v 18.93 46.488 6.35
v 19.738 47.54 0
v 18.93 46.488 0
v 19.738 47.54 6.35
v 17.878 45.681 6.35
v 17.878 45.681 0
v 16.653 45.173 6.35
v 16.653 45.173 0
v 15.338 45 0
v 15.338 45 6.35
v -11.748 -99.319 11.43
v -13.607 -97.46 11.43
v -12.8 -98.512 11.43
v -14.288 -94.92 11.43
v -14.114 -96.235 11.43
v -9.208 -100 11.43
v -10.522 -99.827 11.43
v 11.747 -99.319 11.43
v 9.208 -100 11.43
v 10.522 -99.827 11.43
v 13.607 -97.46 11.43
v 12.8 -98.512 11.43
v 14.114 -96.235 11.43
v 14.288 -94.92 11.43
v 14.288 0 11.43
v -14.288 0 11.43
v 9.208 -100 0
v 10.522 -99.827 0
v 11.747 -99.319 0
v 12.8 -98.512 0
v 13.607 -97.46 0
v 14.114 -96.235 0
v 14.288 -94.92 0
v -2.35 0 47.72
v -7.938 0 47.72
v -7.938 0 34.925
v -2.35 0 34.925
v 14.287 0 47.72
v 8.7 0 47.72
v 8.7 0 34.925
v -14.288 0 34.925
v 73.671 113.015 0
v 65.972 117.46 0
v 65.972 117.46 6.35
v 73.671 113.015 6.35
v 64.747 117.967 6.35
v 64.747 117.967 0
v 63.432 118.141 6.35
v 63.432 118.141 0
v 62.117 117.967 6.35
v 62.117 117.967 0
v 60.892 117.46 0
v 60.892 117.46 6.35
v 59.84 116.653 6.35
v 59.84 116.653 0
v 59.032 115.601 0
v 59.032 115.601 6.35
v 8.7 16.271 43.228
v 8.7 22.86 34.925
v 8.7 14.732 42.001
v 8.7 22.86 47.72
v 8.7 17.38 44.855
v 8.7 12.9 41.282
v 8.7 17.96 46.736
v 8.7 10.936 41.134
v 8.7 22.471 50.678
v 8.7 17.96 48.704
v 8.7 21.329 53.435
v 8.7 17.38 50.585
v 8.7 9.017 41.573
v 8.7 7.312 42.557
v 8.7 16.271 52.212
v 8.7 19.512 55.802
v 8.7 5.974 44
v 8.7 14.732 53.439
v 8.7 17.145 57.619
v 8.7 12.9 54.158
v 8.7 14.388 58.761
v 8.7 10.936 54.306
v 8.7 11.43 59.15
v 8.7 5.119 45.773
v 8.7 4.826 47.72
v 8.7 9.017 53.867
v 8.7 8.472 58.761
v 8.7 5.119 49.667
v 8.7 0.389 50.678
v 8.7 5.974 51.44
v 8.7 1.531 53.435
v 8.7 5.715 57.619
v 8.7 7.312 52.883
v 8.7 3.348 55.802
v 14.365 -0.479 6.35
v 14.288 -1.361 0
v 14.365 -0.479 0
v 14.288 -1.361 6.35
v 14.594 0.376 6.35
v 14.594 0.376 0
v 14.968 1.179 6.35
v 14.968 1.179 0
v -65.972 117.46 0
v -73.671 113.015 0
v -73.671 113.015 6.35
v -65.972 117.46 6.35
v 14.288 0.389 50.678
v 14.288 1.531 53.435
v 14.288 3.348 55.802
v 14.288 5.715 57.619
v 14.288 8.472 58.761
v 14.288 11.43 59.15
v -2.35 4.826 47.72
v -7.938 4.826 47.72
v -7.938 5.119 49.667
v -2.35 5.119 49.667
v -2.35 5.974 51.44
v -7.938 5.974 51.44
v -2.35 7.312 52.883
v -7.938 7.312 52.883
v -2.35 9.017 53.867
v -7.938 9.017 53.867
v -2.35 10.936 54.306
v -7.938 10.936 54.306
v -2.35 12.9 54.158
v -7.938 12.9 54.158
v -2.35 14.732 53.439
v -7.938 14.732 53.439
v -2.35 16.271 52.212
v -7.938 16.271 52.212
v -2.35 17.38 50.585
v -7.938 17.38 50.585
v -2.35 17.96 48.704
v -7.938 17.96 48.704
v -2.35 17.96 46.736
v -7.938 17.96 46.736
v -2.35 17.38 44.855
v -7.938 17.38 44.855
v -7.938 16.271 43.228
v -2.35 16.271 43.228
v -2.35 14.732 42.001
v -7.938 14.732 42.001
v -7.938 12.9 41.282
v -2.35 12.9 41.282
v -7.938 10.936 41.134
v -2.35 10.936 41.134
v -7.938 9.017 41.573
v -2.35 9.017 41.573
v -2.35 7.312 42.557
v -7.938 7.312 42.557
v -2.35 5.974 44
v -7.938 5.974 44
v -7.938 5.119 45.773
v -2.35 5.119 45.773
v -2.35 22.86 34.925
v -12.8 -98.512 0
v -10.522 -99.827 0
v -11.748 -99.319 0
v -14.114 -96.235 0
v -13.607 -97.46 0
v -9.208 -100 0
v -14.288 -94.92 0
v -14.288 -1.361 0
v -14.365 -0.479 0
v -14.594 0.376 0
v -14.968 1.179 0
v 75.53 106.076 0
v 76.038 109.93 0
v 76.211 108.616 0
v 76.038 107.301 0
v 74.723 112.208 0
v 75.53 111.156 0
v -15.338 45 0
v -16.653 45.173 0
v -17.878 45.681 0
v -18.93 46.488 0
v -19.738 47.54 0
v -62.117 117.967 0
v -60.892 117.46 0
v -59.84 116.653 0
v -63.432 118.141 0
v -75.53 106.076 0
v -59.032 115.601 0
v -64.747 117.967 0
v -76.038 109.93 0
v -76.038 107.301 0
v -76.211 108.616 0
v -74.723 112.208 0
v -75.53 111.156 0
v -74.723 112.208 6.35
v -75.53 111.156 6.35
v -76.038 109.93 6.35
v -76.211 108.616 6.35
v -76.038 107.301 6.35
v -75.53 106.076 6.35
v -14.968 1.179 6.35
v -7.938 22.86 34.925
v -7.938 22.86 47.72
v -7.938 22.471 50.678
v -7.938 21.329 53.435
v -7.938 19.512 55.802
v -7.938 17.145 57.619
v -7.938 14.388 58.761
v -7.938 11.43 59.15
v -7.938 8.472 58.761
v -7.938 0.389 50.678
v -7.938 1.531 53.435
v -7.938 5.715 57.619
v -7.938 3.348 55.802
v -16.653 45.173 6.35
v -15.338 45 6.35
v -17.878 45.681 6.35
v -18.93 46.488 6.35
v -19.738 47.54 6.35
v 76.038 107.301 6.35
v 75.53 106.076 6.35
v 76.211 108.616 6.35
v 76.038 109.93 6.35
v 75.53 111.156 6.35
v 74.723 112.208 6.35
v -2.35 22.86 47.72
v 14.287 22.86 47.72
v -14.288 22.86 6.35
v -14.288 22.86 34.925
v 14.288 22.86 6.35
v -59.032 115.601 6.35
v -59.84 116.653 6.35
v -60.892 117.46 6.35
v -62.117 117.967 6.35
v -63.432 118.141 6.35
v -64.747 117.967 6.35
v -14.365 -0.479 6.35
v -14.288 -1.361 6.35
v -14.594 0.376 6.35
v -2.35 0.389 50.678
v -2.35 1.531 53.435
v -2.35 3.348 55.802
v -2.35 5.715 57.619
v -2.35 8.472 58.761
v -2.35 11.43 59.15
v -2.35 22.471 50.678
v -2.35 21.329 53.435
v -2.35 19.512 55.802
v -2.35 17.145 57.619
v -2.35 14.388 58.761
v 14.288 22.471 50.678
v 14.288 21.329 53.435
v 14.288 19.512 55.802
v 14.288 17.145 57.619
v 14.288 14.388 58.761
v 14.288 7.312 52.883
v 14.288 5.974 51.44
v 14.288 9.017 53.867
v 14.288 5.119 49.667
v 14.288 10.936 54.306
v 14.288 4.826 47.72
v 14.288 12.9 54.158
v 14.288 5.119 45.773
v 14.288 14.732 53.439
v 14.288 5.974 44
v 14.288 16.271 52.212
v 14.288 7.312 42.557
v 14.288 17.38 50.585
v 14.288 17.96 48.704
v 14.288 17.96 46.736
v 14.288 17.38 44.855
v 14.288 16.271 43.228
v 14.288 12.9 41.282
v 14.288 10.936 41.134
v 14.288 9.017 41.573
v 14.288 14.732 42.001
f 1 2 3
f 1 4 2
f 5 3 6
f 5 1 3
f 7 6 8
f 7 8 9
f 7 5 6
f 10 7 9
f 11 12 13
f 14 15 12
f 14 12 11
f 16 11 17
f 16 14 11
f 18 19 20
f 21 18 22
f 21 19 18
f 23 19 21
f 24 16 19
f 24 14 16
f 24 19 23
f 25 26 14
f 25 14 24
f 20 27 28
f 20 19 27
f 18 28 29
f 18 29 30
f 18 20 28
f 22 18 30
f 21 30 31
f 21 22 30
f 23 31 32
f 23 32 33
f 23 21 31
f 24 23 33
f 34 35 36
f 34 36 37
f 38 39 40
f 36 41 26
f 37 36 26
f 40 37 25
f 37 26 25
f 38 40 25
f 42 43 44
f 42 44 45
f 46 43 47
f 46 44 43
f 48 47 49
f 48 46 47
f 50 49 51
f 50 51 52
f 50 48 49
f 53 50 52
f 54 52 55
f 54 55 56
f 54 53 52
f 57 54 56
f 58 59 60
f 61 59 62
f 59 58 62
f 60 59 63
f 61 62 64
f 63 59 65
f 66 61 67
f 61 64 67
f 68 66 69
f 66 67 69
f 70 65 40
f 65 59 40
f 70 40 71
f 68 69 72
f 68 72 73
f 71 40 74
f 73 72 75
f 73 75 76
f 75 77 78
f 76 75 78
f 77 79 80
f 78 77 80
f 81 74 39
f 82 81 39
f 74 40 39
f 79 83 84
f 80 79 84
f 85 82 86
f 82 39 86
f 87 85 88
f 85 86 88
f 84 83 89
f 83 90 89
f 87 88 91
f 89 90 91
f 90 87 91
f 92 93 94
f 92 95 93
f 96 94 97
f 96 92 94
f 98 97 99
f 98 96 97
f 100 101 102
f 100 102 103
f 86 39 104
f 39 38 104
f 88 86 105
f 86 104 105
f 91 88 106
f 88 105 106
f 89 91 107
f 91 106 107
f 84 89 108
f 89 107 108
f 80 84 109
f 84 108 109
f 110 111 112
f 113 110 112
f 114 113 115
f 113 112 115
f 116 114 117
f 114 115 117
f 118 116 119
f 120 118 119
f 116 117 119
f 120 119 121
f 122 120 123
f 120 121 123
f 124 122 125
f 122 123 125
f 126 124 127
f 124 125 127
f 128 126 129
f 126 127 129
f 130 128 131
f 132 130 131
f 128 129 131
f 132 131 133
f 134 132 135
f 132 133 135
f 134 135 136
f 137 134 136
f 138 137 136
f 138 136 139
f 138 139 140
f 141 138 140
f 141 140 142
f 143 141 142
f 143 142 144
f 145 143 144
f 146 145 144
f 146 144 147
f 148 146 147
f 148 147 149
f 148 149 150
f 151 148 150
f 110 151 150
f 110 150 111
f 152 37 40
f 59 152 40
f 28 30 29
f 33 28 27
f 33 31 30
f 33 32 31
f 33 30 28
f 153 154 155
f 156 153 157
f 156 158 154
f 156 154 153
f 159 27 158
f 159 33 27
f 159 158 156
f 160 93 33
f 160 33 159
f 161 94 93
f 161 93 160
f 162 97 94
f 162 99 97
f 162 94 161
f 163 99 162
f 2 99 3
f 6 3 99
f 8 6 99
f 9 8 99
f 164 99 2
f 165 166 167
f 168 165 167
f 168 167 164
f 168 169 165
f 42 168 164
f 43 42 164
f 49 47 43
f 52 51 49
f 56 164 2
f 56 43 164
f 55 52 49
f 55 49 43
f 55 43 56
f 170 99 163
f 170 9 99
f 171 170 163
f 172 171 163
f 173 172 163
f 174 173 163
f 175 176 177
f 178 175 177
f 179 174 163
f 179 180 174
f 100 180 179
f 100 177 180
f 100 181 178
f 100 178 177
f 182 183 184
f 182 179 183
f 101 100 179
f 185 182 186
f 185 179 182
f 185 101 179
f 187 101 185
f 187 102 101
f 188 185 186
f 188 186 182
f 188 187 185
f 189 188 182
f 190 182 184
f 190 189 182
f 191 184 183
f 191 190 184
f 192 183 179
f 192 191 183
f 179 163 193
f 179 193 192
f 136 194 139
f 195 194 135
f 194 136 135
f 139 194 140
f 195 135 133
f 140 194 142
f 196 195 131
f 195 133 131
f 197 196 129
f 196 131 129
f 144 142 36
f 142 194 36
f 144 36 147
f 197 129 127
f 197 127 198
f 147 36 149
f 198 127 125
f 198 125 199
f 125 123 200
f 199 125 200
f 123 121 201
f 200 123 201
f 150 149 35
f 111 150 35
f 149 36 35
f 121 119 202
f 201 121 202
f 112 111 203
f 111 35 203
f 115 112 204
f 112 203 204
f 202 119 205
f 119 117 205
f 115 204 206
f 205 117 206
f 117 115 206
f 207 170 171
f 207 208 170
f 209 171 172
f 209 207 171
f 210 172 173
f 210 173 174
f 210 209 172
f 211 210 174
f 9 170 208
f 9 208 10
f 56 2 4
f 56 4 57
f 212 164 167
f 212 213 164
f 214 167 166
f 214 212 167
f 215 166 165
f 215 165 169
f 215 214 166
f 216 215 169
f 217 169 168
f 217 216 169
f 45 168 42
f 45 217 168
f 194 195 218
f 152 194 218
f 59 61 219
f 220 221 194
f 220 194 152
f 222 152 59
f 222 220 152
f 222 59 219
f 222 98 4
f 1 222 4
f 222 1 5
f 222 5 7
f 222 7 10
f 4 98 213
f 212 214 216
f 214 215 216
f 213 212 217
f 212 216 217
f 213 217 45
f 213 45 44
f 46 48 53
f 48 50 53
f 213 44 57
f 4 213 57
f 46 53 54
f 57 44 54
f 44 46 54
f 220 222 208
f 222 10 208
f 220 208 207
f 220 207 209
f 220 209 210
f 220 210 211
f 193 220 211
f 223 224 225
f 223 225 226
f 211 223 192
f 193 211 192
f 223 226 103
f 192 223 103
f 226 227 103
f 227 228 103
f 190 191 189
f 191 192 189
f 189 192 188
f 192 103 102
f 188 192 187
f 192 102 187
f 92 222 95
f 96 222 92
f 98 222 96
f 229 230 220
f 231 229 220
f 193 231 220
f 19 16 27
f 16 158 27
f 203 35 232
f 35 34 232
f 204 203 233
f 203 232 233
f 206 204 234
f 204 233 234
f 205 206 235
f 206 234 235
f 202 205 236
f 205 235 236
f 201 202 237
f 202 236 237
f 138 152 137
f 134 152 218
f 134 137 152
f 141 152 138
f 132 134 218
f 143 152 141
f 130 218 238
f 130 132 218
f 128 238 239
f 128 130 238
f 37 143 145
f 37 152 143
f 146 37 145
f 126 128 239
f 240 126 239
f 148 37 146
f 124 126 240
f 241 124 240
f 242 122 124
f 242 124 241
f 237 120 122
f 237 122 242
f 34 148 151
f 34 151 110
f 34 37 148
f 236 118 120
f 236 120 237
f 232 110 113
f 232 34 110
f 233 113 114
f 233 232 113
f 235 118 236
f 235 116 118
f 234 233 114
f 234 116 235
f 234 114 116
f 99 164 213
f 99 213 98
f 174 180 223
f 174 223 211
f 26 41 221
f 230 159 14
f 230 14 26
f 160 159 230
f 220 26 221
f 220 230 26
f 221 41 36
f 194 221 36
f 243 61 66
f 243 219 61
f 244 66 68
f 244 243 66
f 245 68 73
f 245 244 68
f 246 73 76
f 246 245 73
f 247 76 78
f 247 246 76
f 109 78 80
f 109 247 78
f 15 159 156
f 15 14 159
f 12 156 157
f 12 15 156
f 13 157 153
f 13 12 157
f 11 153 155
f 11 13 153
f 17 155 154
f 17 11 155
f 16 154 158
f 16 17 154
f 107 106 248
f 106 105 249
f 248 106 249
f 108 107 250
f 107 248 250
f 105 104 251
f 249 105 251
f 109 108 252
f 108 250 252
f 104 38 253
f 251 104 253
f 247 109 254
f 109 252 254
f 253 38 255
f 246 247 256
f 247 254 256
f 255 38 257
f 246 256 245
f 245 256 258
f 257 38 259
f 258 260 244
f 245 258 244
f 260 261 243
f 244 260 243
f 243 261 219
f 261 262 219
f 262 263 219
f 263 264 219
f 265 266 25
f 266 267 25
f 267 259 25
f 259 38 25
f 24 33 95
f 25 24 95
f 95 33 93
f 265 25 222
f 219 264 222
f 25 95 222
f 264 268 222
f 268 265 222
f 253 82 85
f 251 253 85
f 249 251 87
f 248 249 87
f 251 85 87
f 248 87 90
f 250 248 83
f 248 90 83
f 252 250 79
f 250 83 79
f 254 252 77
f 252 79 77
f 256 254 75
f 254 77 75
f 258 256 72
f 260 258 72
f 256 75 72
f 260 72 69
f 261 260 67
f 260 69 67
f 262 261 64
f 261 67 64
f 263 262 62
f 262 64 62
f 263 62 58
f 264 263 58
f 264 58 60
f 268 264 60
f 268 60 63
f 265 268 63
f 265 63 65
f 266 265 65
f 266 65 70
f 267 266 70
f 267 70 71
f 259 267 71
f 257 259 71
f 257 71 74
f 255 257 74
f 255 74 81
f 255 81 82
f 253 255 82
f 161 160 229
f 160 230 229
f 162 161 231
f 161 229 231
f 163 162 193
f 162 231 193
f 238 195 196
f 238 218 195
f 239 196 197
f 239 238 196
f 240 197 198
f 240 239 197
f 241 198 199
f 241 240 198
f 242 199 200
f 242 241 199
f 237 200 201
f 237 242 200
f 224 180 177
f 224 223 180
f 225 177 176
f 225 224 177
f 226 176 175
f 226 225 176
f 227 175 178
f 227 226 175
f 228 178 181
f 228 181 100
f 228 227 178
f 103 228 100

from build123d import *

# Parameters (mm, degrees)
BOSS_EXTRUDE1_DEPTH = 6.35
SKETCH3_W           = 28.575
SKETCH3_H           = 22.86
BOSS_EXTRUDE2_DEPTH = 52.8
SKETCH6_W           = 28.575
SKETCH6_H           = 100
BOSS_EXTRUDE3_DEPTH = 5.08
FILLET1_R           = 5.08
SKETCH4_W           = 6.35
SKETCH4_H           = 24.225
SKETCH4_W_2         = 11.049
CUT_EXTRUDE1_DEPTH  = 153.525464126
FILLET3_R           = 11.43
SKETCH5_R           = 6.604
CUT_EXTRUDE2_DEPTH  = 157.642486403


with BuildPart() as part:
    # Sketch1 → Boss-Extrude1 (new body)
    with BuildSketch(Plane.XY):
        Polygon((-18.271216857, 45), (18.271216857, 45), (61.572487047, 120), (78.070270989, 110.475), (14.2875, 0), (14.2875, -100), (-14.2875, -100), (-14.2875, 0), (-78.070270989, 110.475), (-61.572487047, 120), align=None)
    extrude(amount=BOSS_EXTRUDE1_DEPTH)

    # Sketch3 → Boss-Extrude2 (add)
    with BuildSketch(Plane.XY.offset(6.35)):
        with Locations((0, 11.43)):
            Rectangle(SKETCH3_W, SKETCH3_H)
    extrude(amount=BOSS_EXTRUDE2_DEPTH)

    # Sketch6 → Boss-Extrude3 (add)
    with BuildSketch(Plane.XY.offset(6.35)):
        with Locations((0, -50)):
            Rectangle(SKETCH6_W, SKETCH6_H)
    extrude(amount=BOSS_EXTRUDE3_DEPTH)

    # Fillet1
    fillet1_edges = [part.edges().sort_by_distance(p)[0] for p in [
        (-18.271216857, 45, 3.175),
        (18.271216857, 45, 3.175),
        (61.572487047, 120, 3.175),
        (78.070270989, 110.475, 3.175),
        (14.2875, 0, 3.175),
        (14.2875, -100, 5.715),
        (-14.2875, -100, 5.715),
        (-14.2875, 0, 3.175),
        (-78.070270989, 110.475, 3.175),
        (-61.572487047, 120, 3.175),
    ]]
    fillet(fillet1_edges, radius=FILLET1_R)

    # Sketch4 → Cut-Extrude1 (cut, through all)
    with BuildSketch(Plane.XZ):
        with Locations((-11.1125, 47.0375)):
            Rectangle(SKETCH4_W, SKETCH4_H)
        with Locations((3.175, 47.0375)):
            Rectangle(SKETCH4_W_2, SKETCH4_H)
    extrude(amount=-CUT_EXTRUDE1_DEPTH, mode=Mode.SUBTRACT)

    # Fillet3
    fillet3_edges = [part.edges().sort_by_distance(p)[0] for p in [
        (11.4935, 22.86, 59.15),
        (-5.1435, 22.86, 59.15),
        (11.4935, 0, 59.15),
        (-5.1435, 0, 59.15),
    ]]
    fillet(fillet3_edges, radius=FILLET3_R - 0.0001)  # a hair under: the kernel refuses the full size

    # Sketch5 → Cut-Extrude2 (cut, through all)
    with BuildSketch(Plane.ZY.offset(7.9375)):
        with Locations(Location((47.72, 11.43, 0), (0, 0, 270))):
            Circle(SKETCH5_R)
    extrude(amount=-CUT_EXTRUDE2_DEPTH, mode=Mode.SUBTRACT)


solid = part.part
